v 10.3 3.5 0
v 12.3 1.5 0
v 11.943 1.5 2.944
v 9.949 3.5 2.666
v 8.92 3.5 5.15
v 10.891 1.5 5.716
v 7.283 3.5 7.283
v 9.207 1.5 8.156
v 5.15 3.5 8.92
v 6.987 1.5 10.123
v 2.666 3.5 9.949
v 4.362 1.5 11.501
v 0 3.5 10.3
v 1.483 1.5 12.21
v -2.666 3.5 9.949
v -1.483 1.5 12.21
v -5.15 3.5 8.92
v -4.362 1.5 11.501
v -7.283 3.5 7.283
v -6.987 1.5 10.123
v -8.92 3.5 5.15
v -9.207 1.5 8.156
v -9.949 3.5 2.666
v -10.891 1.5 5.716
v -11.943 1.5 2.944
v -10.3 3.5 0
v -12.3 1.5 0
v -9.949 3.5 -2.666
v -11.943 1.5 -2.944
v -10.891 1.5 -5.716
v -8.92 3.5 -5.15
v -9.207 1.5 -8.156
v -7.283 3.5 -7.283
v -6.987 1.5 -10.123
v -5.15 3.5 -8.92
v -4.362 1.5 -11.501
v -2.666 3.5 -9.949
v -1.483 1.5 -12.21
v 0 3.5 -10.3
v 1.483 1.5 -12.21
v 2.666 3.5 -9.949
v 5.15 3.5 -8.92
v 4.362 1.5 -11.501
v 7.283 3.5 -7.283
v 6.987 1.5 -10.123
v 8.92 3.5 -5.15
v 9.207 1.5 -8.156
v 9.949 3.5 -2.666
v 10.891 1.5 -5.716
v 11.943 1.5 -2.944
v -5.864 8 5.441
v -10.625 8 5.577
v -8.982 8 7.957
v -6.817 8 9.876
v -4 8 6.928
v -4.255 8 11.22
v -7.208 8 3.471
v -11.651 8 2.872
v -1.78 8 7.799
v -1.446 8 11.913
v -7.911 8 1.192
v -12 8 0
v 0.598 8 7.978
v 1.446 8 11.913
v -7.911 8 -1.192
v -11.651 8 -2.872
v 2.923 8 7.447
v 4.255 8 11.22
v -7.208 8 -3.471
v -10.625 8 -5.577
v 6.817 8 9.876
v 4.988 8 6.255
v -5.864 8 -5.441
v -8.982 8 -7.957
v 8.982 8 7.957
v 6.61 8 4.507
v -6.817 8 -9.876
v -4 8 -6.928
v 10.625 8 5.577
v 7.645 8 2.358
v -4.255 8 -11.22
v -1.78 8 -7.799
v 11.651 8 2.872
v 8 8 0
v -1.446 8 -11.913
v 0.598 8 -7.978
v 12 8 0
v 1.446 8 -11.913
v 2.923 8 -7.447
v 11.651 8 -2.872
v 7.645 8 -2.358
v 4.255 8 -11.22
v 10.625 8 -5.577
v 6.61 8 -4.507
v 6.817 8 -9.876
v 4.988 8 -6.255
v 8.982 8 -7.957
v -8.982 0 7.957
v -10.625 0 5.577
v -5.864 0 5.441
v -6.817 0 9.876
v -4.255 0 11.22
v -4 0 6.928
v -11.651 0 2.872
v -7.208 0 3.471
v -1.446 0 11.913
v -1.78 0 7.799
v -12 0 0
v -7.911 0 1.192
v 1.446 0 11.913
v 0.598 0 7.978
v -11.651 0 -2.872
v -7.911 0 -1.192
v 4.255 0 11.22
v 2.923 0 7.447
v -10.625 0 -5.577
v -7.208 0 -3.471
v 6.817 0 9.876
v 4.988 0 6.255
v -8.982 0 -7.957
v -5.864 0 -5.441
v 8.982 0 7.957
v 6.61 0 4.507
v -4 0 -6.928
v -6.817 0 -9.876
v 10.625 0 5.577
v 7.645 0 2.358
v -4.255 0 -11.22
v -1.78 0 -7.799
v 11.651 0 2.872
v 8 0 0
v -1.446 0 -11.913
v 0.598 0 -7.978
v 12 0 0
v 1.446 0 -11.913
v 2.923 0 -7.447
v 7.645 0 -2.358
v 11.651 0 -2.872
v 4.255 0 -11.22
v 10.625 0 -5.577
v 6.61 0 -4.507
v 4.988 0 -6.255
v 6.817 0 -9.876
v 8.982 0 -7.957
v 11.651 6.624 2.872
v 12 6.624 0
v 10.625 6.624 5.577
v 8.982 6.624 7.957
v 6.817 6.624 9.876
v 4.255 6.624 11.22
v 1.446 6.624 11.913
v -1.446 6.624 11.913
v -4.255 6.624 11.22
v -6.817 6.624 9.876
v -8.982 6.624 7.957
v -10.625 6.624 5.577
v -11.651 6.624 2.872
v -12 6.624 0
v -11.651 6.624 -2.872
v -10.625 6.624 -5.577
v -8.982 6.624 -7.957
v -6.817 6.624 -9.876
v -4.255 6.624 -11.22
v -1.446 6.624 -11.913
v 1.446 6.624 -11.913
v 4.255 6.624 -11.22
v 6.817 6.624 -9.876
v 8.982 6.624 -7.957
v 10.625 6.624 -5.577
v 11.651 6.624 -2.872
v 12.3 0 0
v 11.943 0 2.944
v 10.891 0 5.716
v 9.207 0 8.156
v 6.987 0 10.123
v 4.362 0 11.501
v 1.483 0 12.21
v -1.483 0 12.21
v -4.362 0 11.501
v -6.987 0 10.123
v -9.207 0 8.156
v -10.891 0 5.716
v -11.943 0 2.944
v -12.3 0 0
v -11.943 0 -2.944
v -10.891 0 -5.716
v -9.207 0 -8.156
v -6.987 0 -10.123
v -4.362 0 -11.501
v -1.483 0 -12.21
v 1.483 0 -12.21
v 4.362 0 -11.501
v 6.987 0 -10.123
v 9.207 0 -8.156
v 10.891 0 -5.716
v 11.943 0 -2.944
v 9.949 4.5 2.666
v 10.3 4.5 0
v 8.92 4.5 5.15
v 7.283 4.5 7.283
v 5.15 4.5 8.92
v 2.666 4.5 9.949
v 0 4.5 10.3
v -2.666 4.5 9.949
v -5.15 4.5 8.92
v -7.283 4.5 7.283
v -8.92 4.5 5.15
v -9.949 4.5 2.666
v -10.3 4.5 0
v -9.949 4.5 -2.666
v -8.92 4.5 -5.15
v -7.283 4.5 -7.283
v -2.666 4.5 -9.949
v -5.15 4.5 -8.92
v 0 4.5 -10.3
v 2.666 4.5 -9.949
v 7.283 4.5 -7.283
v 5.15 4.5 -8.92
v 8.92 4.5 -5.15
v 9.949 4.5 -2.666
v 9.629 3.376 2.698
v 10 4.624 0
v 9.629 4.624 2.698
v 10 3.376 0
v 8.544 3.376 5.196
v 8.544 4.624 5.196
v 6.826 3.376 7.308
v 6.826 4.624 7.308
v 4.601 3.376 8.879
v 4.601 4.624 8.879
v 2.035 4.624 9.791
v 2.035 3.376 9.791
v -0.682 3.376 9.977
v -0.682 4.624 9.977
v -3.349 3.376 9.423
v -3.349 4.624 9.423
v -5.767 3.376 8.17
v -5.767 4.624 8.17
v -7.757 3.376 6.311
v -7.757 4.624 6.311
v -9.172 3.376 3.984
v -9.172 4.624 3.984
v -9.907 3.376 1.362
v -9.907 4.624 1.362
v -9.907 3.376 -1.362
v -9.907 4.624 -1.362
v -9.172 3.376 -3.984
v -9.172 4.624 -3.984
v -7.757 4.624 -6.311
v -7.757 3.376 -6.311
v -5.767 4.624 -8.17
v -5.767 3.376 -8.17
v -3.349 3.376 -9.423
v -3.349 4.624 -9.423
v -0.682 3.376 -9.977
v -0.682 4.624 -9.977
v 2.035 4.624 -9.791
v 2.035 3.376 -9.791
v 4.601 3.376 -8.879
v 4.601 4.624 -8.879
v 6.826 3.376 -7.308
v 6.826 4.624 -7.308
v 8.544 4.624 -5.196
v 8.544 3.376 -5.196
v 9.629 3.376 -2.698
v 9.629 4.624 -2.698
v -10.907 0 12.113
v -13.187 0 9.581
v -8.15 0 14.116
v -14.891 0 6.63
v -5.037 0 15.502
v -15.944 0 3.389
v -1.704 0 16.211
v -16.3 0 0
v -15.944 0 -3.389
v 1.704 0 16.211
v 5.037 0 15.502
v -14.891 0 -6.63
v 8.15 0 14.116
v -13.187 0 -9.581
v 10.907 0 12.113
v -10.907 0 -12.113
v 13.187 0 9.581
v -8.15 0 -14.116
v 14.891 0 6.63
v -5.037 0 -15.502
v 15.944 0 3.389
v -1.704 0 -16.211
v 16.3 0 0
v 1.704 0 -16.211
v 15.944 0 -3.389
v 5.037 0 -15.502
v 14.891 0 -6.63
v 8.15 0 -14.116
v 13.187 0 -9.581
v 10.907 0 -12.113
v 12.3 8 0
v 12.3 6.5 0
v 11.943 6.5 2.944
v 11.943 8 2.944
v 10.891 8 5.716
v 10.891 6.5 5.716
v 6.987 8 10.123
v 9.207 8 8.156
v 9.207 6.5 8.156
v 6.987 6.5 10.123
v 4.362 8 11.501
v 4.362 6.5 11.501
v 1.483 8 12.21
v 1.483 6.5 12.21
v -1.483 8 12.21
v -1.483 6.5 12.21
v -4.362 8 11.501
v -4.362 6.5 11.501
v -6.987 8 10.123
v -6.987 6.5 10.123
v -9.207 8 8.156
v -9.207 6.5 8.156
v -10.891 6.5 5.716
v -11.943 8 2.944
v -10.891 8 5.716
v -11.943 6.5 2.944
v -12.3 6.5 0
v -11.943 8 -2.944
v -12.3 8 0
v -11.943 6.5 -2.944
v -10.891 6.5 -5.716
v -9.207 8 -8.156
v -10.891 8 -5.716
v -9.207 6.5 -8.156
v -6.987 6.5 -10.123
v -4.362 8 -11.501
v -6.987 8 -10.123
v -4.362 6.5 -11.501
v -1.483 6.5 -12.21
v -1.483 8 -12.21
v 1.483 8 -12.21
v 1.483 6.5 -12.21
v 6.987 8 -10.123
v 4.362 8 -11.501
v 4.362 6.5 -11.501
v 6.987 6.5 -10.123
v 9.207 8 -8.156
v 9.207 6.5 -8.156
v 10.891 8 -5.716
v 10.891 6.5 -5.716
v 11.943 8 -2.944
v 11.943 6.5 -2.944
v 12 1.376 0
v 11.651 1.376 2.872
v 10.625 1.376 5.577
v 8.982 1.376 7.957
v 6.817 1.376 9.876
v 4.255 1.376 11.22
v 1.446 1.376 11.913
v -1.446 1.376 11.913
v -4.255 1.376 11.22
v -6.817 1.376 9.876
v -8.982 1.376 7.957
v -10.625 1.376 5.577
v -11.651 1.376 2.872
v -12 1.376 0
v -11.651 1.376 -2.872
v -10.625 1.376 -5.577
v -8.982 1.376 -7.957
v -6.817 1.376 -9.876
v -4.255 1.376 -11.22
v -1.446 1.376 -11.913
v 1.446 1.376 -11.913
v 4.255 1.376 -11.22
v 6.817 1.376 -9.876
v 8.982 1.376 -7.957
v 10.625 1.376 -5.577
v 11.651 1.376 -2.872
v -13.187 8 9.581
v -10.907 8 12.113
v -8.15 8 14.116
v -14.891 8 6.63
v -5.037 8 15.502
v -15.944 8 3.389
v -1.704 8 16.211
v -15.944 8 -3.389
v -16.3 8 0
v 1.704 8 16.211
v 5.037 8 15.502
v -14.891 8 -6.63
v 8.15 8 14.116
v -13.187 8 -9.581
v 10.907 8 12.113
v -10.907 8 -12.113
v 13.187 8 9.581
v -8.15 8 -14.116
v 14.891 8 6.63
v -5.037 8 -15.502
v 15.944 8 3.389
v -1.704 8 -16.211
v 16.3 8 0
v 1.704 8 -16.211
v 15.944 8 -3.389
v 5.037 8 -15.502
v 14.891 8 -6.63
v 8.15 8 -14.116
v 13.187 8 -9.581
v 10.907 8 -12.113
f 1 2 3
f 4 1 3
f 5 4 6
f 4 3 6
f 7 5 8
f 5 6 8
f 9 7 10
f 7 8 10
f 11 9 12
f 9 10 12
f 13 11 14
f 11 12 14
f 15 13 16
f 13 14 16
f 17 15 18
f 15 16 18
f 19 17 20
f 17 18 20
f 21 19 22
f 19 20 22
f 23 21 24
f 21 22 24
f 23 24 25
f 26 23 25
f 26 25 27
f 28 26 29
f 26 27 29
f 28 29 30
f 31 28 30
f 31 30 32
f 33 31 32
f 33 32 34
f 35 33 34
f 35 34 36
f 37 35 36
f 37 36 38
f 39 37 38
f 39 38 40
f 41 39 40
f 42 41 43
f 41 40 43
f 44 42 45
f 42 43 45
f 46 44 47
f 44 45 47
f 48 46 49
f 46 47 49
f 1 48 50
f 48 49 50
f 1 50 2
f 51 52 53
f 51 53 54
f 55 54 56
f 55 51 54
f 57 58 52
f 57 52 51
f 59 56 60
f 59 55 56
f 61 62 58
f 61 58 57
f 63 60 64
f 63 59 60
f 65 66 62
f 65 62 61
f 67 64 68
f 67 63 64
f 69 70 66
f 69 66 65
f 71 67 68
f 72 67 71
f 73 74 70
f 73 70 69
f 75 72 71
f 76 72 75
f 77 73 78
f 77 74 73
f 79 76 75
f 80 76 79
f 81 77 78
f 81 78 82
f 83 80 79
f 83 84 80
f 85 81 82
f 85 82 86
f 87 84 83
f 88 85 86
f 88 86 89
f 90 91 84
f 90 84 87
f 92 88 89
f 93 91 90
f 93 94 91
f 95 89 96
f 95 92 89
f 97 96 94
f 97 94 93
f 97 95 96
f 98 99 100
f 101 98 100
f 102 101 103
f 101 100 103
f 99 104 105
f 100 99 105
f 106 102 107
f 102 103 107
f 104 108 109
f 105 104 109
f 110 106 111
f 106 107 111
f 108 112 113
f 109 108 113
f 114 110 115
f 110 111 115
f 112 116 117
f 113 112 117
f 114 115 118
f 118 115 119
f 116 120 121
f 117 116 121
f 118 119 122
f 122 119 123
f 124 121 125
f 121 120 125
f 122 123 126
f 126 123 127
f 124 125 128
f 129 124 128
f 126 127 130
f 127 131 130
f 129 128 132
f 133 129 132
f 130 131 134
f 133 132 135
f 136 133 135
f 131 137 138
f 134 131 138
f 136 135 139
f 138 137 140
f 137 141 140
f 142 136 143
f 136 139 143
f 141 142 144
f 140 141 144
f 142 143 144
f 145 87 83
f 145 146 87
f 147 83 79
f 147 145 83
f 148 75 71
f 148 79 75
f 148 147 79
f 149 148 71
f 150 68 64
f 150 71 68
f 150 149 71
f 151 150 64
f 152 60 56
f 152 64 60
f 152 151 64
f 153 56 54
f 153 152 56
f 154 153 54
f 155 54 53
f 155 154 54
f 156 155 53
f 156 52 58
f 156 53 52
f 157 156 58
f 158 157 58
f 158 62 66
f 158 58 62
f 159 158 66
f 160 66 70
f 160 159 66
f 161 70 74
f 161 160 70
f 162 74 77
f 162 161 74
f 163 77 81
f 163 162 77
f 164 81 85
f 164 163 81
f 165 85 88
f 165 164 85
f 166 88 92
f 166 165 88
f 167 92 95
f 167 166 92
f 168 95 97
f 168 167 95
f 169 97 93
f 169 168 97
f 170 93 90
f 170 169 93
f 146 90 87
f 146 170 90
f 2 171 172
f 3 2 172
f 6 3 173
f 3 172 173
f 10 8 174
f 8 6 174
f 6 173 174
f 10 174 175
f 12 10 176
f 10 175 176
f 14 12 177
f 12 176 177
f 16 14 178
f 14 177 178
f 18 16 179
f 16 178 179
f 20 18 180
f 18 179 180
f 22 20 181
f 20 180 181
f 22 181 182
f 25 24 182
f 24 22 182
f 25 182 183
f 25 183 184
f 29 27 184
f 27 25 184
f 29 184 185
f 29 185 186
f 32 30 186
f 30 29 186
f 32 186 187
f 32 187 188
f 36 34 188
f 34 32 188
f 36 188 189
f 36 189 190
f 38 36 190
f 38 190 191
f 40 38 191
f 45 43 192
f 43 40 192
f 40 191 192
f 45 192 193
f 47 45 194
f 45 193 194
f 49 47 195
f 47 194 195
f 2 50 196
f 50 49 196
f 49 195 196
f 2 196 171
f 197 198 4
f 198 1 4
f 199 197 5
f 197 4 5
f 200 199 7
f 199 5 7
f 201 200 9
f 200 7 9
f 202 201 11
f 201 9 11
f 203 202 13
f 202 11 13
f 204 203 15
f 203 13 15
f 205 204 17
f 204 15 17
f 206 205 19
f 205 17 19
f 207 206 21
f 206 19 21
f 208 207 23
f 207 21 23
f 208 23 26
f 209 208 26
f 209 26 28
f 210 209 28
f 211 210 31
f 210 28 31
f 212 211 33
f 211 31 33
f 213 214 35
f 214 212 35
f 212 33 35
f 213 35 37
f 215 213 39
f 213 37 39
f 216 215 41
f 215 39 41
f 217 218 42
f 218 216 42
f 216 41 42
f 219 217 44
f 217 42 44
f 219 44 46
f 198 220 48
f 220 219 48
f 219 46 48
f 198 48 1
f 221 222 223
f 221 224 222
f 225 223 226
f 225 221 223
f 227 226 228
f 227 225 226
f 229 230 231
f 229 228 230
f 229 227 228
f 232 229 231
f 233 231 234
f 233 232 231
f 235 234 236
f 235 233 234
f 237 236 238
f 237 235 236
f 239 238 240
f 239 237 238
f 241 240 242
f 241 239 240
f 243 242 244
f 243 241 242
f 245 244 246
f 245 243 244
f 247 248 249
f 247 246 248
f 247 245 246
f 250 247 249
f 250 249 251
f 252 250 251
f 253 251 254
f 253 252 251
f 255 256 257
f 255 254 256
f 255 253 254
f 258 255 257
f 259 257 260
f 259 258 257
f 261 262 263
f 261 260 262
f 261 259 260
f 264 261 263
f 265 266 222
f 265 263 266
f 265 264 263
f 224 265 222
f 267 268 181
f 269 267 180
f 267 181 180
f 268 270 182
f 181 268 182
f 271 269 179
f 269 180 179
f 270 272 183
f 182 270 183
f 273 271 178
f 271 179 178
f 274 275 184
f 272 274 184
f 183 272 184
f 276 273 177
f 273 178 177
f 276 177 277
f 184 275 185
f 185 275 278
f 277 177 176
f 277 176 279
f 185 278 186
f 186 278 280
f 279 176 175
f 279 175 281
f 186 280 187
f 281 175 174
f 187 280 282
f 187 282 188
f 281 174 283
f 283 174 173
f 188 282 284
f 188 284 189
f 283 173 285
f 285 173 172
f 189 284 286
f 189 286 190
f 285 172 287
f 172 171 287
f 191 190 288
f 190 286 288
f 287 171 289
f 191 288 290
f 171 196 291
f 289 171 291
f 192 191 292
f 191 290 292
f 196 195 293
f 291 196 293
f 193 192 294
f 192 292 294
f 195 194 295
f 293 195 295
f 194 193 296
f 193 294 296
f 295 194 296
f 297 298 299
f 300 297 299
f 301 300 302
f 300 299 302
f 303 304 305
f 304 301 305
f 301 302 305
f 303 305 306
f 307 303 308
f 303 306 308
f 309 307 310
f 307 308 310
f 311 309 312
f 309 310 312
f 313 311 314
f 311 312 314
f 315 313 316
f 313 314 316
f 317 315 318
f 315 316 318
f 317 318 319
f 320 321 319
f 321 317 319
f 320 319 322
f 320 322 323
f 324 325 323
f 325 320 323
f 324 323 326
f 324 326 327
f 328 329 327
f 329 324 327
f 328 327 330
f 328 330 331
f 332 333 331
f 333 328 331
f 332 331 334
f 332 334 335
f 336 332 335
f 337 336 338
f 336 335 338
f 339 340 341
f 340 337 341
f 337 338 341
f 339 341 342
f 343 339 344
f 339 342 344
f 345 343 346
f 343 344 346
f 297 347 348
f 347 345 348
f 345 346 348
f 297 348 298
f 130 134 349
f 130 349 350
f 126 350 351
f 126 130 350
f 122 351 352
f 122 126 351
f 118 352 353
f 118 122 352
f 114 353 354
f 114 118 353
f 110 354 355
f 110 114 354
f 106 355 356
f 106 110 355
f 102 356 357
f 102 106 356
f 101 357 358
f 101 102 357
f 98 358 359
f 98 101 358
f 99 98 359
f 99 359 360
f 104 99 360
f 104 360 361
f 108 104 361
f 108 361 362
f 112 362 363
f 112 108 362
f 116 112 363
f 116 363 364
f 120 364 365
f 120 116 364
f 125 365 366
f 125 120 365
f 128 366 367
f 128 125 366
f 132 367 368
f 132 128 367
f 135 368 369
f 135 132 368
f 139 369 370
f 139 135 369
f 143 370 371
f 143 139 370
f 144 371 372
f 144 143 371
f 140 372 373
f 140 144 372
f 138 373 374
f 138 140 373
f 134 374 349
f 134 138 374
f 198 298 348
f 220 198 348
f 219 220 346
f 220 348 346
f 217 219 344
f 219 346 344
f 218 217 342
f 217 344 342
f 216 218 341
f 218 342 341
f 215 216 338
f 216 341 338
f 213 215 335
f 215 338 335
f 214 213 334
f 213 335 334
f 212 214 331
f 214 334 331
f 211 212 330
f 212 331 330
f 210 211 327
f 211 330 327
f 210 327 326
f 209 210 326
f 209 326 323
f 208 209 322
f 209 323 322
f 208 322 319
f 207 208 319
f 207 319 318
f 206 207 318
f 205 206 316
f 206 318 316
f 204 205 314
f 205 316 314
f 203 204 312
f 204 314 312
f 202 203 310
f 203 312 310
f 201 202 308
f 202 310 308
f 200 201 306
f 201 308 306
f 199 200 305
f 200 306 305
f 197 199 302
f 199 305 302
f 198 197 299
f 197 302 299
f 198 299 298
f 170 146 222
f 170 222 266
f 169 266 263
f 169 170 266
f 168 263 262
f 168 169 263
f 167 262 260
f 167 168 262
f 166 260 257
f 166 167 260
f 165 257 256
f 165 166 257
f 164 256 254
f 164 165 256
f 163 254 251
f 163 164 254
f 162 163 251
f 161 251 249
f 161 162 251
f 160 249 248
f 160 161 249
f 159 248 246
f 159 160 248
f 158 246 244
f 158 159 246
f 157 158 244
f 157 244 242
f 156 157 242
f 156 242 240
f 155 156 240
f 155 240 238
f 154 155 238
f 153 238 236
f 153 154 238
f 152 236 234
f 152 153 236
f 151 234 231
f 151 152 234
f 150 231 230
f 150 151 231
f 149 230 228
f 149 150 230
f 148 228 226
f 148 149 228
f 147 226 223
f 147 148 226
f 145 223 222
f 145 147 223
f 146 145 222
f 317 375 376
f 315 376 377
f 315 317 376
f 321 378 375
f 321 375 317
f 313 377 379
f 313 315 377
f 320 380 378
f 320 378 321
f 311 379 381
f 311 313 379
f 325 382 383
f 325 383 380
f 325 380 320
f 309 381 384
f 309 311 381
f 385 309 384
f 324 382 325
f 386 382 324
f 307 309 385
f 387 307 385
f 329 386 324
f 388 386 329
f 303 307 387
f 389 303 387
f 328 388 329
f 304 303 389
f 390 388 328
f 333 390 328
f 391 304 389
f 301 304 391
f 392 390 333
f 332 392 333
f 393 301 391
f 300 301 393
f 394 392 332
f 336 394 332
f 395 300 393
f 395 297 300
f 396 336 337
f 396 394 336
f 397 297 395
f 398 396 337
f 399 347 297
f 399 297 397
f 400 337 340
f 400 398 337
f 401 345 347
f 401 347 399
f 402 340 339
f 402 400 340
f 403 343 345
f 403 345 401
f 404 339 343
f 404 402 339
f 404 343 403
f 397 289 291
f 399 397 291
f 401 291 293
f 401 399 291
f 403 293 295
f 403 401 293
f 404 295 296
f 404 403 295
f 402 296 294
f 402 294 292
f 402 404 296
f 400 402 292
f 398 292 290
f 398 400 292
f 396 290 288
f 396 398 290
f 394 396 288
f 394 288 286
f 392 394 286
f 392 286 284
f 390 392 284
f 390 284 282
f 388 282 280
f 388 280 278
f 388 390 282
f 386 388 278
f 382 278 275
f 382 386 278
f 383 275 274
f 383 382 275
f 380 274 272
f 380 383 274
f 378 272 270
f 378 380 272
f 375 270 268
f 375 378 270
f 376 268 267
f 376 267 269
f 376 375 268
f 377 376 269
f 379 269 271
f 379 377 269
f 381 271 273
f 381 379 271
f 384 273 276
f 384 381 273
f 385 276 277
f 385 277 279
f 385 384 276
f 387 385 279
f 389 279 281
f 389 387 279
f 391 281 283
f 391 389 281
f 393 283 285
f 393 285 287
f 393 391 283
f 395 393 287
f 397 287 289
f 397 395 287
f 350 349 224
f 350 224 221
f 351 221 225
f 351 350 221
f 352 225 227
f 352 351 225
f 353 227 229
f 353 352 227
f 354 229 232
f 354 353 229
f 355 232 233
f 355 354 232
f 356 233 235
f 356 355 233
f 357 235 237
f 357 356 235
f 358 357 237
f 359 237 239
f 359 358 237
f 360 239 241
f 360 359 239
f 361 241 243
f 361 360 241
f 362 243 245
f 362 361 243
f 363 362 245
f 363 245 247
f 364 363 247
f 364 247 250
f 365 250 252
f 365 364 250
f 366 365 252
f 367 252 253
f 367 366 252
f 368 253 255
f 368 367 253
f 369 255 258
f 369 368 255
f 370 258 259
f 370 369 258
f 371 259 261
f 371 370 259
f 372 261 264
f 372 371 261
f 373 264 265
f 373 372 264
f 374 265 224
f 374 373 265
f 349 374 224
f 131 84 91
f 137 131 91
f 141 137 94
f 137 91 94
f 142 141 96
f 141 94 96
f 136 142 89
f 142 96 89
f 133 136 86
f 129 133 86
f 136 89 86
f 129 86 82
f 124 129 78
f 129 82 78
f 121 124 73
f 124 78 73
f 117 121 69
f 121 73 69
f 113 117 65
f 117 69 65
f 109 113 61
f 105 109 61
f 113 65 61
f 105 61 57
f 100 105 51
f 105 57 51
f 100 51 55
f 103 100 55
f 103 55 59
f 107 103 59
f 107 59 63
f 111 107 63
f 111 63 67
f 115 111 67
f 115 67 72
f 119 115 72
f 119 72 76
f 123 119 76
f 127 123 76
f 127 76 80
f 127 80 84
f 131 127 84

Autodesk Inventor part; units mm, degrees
ref_plane "YZ Plane" through (0, 0, 0) normal (1, 0, 0) x (0, 1, 0)
ref_plane "XZ Plane" through (0, 0, 0) normal (0, 1, 0) x (-1, 0, 0)
ref_plane "XY Plane" through (0, 0, 0) normal (0, 0, 1) x (1, 0, 0)
sketch "Sketch1" plane through (0, 0, 0) normal (0, 0, 1) x (1, 0, 0)
  line L0 (0, 0) -> (0, 31.7838) construction
  line L1 (8, 0) -> (8, 8)
  line L2 (8, 8) -> (12, 8)
  line L3 (12, 8) -> (12, 6.6243)
  line L4 (12, 6.6243) -> (10, 4.6243)
  line L5 (10, 4.6243) -> (10, 3.3757)
  line L6 (10, 3.3757) -> (12, 1.3757)
  line L7 (12, 1.3757) -> (12, 0)
  line L8 (12, 0) -> (8, 0)
  line L9 (12.3, 8) -> (12.3, 6.5)
  line L10 (12.3, 6.5) -> (10.3, 4.5)
  line L11 (10.3, 4.5) -> (10.3, 3.5)
  line L12 (10.3, 3.5) -> (12.3, 1.5)
  line L13 (12.3, 1.5) -> (12.3, 0)
  line L14 (16.3, 0) -> (16.3, 8)
  line L15 (16.3, 8) -> (12.3, 8)
  line L16 (12.3, 0) -> (16.3, 0)
  point P0 (11.3, 5.5)
  dimension "d0" = 8
  dimension "d1" = 4
  dimension "d2" = 135
  dimension "d3" = 4
  dimension "d4" = 0.3
  dimension "d5" = 0.3
  dimension "d6" = 0.3
  dimension "d7" = 8
  dimension "d8" = 1.5
  dimension "d9" = 1
revolve "Revolution1" add sketch "Sketch1" angle 360 about axis through (0, 0, 0) along (0, 1, 0)
equation "\"d5\" = d4"
equation "\"d6\" = d4"
properties part number "BearingTest"
